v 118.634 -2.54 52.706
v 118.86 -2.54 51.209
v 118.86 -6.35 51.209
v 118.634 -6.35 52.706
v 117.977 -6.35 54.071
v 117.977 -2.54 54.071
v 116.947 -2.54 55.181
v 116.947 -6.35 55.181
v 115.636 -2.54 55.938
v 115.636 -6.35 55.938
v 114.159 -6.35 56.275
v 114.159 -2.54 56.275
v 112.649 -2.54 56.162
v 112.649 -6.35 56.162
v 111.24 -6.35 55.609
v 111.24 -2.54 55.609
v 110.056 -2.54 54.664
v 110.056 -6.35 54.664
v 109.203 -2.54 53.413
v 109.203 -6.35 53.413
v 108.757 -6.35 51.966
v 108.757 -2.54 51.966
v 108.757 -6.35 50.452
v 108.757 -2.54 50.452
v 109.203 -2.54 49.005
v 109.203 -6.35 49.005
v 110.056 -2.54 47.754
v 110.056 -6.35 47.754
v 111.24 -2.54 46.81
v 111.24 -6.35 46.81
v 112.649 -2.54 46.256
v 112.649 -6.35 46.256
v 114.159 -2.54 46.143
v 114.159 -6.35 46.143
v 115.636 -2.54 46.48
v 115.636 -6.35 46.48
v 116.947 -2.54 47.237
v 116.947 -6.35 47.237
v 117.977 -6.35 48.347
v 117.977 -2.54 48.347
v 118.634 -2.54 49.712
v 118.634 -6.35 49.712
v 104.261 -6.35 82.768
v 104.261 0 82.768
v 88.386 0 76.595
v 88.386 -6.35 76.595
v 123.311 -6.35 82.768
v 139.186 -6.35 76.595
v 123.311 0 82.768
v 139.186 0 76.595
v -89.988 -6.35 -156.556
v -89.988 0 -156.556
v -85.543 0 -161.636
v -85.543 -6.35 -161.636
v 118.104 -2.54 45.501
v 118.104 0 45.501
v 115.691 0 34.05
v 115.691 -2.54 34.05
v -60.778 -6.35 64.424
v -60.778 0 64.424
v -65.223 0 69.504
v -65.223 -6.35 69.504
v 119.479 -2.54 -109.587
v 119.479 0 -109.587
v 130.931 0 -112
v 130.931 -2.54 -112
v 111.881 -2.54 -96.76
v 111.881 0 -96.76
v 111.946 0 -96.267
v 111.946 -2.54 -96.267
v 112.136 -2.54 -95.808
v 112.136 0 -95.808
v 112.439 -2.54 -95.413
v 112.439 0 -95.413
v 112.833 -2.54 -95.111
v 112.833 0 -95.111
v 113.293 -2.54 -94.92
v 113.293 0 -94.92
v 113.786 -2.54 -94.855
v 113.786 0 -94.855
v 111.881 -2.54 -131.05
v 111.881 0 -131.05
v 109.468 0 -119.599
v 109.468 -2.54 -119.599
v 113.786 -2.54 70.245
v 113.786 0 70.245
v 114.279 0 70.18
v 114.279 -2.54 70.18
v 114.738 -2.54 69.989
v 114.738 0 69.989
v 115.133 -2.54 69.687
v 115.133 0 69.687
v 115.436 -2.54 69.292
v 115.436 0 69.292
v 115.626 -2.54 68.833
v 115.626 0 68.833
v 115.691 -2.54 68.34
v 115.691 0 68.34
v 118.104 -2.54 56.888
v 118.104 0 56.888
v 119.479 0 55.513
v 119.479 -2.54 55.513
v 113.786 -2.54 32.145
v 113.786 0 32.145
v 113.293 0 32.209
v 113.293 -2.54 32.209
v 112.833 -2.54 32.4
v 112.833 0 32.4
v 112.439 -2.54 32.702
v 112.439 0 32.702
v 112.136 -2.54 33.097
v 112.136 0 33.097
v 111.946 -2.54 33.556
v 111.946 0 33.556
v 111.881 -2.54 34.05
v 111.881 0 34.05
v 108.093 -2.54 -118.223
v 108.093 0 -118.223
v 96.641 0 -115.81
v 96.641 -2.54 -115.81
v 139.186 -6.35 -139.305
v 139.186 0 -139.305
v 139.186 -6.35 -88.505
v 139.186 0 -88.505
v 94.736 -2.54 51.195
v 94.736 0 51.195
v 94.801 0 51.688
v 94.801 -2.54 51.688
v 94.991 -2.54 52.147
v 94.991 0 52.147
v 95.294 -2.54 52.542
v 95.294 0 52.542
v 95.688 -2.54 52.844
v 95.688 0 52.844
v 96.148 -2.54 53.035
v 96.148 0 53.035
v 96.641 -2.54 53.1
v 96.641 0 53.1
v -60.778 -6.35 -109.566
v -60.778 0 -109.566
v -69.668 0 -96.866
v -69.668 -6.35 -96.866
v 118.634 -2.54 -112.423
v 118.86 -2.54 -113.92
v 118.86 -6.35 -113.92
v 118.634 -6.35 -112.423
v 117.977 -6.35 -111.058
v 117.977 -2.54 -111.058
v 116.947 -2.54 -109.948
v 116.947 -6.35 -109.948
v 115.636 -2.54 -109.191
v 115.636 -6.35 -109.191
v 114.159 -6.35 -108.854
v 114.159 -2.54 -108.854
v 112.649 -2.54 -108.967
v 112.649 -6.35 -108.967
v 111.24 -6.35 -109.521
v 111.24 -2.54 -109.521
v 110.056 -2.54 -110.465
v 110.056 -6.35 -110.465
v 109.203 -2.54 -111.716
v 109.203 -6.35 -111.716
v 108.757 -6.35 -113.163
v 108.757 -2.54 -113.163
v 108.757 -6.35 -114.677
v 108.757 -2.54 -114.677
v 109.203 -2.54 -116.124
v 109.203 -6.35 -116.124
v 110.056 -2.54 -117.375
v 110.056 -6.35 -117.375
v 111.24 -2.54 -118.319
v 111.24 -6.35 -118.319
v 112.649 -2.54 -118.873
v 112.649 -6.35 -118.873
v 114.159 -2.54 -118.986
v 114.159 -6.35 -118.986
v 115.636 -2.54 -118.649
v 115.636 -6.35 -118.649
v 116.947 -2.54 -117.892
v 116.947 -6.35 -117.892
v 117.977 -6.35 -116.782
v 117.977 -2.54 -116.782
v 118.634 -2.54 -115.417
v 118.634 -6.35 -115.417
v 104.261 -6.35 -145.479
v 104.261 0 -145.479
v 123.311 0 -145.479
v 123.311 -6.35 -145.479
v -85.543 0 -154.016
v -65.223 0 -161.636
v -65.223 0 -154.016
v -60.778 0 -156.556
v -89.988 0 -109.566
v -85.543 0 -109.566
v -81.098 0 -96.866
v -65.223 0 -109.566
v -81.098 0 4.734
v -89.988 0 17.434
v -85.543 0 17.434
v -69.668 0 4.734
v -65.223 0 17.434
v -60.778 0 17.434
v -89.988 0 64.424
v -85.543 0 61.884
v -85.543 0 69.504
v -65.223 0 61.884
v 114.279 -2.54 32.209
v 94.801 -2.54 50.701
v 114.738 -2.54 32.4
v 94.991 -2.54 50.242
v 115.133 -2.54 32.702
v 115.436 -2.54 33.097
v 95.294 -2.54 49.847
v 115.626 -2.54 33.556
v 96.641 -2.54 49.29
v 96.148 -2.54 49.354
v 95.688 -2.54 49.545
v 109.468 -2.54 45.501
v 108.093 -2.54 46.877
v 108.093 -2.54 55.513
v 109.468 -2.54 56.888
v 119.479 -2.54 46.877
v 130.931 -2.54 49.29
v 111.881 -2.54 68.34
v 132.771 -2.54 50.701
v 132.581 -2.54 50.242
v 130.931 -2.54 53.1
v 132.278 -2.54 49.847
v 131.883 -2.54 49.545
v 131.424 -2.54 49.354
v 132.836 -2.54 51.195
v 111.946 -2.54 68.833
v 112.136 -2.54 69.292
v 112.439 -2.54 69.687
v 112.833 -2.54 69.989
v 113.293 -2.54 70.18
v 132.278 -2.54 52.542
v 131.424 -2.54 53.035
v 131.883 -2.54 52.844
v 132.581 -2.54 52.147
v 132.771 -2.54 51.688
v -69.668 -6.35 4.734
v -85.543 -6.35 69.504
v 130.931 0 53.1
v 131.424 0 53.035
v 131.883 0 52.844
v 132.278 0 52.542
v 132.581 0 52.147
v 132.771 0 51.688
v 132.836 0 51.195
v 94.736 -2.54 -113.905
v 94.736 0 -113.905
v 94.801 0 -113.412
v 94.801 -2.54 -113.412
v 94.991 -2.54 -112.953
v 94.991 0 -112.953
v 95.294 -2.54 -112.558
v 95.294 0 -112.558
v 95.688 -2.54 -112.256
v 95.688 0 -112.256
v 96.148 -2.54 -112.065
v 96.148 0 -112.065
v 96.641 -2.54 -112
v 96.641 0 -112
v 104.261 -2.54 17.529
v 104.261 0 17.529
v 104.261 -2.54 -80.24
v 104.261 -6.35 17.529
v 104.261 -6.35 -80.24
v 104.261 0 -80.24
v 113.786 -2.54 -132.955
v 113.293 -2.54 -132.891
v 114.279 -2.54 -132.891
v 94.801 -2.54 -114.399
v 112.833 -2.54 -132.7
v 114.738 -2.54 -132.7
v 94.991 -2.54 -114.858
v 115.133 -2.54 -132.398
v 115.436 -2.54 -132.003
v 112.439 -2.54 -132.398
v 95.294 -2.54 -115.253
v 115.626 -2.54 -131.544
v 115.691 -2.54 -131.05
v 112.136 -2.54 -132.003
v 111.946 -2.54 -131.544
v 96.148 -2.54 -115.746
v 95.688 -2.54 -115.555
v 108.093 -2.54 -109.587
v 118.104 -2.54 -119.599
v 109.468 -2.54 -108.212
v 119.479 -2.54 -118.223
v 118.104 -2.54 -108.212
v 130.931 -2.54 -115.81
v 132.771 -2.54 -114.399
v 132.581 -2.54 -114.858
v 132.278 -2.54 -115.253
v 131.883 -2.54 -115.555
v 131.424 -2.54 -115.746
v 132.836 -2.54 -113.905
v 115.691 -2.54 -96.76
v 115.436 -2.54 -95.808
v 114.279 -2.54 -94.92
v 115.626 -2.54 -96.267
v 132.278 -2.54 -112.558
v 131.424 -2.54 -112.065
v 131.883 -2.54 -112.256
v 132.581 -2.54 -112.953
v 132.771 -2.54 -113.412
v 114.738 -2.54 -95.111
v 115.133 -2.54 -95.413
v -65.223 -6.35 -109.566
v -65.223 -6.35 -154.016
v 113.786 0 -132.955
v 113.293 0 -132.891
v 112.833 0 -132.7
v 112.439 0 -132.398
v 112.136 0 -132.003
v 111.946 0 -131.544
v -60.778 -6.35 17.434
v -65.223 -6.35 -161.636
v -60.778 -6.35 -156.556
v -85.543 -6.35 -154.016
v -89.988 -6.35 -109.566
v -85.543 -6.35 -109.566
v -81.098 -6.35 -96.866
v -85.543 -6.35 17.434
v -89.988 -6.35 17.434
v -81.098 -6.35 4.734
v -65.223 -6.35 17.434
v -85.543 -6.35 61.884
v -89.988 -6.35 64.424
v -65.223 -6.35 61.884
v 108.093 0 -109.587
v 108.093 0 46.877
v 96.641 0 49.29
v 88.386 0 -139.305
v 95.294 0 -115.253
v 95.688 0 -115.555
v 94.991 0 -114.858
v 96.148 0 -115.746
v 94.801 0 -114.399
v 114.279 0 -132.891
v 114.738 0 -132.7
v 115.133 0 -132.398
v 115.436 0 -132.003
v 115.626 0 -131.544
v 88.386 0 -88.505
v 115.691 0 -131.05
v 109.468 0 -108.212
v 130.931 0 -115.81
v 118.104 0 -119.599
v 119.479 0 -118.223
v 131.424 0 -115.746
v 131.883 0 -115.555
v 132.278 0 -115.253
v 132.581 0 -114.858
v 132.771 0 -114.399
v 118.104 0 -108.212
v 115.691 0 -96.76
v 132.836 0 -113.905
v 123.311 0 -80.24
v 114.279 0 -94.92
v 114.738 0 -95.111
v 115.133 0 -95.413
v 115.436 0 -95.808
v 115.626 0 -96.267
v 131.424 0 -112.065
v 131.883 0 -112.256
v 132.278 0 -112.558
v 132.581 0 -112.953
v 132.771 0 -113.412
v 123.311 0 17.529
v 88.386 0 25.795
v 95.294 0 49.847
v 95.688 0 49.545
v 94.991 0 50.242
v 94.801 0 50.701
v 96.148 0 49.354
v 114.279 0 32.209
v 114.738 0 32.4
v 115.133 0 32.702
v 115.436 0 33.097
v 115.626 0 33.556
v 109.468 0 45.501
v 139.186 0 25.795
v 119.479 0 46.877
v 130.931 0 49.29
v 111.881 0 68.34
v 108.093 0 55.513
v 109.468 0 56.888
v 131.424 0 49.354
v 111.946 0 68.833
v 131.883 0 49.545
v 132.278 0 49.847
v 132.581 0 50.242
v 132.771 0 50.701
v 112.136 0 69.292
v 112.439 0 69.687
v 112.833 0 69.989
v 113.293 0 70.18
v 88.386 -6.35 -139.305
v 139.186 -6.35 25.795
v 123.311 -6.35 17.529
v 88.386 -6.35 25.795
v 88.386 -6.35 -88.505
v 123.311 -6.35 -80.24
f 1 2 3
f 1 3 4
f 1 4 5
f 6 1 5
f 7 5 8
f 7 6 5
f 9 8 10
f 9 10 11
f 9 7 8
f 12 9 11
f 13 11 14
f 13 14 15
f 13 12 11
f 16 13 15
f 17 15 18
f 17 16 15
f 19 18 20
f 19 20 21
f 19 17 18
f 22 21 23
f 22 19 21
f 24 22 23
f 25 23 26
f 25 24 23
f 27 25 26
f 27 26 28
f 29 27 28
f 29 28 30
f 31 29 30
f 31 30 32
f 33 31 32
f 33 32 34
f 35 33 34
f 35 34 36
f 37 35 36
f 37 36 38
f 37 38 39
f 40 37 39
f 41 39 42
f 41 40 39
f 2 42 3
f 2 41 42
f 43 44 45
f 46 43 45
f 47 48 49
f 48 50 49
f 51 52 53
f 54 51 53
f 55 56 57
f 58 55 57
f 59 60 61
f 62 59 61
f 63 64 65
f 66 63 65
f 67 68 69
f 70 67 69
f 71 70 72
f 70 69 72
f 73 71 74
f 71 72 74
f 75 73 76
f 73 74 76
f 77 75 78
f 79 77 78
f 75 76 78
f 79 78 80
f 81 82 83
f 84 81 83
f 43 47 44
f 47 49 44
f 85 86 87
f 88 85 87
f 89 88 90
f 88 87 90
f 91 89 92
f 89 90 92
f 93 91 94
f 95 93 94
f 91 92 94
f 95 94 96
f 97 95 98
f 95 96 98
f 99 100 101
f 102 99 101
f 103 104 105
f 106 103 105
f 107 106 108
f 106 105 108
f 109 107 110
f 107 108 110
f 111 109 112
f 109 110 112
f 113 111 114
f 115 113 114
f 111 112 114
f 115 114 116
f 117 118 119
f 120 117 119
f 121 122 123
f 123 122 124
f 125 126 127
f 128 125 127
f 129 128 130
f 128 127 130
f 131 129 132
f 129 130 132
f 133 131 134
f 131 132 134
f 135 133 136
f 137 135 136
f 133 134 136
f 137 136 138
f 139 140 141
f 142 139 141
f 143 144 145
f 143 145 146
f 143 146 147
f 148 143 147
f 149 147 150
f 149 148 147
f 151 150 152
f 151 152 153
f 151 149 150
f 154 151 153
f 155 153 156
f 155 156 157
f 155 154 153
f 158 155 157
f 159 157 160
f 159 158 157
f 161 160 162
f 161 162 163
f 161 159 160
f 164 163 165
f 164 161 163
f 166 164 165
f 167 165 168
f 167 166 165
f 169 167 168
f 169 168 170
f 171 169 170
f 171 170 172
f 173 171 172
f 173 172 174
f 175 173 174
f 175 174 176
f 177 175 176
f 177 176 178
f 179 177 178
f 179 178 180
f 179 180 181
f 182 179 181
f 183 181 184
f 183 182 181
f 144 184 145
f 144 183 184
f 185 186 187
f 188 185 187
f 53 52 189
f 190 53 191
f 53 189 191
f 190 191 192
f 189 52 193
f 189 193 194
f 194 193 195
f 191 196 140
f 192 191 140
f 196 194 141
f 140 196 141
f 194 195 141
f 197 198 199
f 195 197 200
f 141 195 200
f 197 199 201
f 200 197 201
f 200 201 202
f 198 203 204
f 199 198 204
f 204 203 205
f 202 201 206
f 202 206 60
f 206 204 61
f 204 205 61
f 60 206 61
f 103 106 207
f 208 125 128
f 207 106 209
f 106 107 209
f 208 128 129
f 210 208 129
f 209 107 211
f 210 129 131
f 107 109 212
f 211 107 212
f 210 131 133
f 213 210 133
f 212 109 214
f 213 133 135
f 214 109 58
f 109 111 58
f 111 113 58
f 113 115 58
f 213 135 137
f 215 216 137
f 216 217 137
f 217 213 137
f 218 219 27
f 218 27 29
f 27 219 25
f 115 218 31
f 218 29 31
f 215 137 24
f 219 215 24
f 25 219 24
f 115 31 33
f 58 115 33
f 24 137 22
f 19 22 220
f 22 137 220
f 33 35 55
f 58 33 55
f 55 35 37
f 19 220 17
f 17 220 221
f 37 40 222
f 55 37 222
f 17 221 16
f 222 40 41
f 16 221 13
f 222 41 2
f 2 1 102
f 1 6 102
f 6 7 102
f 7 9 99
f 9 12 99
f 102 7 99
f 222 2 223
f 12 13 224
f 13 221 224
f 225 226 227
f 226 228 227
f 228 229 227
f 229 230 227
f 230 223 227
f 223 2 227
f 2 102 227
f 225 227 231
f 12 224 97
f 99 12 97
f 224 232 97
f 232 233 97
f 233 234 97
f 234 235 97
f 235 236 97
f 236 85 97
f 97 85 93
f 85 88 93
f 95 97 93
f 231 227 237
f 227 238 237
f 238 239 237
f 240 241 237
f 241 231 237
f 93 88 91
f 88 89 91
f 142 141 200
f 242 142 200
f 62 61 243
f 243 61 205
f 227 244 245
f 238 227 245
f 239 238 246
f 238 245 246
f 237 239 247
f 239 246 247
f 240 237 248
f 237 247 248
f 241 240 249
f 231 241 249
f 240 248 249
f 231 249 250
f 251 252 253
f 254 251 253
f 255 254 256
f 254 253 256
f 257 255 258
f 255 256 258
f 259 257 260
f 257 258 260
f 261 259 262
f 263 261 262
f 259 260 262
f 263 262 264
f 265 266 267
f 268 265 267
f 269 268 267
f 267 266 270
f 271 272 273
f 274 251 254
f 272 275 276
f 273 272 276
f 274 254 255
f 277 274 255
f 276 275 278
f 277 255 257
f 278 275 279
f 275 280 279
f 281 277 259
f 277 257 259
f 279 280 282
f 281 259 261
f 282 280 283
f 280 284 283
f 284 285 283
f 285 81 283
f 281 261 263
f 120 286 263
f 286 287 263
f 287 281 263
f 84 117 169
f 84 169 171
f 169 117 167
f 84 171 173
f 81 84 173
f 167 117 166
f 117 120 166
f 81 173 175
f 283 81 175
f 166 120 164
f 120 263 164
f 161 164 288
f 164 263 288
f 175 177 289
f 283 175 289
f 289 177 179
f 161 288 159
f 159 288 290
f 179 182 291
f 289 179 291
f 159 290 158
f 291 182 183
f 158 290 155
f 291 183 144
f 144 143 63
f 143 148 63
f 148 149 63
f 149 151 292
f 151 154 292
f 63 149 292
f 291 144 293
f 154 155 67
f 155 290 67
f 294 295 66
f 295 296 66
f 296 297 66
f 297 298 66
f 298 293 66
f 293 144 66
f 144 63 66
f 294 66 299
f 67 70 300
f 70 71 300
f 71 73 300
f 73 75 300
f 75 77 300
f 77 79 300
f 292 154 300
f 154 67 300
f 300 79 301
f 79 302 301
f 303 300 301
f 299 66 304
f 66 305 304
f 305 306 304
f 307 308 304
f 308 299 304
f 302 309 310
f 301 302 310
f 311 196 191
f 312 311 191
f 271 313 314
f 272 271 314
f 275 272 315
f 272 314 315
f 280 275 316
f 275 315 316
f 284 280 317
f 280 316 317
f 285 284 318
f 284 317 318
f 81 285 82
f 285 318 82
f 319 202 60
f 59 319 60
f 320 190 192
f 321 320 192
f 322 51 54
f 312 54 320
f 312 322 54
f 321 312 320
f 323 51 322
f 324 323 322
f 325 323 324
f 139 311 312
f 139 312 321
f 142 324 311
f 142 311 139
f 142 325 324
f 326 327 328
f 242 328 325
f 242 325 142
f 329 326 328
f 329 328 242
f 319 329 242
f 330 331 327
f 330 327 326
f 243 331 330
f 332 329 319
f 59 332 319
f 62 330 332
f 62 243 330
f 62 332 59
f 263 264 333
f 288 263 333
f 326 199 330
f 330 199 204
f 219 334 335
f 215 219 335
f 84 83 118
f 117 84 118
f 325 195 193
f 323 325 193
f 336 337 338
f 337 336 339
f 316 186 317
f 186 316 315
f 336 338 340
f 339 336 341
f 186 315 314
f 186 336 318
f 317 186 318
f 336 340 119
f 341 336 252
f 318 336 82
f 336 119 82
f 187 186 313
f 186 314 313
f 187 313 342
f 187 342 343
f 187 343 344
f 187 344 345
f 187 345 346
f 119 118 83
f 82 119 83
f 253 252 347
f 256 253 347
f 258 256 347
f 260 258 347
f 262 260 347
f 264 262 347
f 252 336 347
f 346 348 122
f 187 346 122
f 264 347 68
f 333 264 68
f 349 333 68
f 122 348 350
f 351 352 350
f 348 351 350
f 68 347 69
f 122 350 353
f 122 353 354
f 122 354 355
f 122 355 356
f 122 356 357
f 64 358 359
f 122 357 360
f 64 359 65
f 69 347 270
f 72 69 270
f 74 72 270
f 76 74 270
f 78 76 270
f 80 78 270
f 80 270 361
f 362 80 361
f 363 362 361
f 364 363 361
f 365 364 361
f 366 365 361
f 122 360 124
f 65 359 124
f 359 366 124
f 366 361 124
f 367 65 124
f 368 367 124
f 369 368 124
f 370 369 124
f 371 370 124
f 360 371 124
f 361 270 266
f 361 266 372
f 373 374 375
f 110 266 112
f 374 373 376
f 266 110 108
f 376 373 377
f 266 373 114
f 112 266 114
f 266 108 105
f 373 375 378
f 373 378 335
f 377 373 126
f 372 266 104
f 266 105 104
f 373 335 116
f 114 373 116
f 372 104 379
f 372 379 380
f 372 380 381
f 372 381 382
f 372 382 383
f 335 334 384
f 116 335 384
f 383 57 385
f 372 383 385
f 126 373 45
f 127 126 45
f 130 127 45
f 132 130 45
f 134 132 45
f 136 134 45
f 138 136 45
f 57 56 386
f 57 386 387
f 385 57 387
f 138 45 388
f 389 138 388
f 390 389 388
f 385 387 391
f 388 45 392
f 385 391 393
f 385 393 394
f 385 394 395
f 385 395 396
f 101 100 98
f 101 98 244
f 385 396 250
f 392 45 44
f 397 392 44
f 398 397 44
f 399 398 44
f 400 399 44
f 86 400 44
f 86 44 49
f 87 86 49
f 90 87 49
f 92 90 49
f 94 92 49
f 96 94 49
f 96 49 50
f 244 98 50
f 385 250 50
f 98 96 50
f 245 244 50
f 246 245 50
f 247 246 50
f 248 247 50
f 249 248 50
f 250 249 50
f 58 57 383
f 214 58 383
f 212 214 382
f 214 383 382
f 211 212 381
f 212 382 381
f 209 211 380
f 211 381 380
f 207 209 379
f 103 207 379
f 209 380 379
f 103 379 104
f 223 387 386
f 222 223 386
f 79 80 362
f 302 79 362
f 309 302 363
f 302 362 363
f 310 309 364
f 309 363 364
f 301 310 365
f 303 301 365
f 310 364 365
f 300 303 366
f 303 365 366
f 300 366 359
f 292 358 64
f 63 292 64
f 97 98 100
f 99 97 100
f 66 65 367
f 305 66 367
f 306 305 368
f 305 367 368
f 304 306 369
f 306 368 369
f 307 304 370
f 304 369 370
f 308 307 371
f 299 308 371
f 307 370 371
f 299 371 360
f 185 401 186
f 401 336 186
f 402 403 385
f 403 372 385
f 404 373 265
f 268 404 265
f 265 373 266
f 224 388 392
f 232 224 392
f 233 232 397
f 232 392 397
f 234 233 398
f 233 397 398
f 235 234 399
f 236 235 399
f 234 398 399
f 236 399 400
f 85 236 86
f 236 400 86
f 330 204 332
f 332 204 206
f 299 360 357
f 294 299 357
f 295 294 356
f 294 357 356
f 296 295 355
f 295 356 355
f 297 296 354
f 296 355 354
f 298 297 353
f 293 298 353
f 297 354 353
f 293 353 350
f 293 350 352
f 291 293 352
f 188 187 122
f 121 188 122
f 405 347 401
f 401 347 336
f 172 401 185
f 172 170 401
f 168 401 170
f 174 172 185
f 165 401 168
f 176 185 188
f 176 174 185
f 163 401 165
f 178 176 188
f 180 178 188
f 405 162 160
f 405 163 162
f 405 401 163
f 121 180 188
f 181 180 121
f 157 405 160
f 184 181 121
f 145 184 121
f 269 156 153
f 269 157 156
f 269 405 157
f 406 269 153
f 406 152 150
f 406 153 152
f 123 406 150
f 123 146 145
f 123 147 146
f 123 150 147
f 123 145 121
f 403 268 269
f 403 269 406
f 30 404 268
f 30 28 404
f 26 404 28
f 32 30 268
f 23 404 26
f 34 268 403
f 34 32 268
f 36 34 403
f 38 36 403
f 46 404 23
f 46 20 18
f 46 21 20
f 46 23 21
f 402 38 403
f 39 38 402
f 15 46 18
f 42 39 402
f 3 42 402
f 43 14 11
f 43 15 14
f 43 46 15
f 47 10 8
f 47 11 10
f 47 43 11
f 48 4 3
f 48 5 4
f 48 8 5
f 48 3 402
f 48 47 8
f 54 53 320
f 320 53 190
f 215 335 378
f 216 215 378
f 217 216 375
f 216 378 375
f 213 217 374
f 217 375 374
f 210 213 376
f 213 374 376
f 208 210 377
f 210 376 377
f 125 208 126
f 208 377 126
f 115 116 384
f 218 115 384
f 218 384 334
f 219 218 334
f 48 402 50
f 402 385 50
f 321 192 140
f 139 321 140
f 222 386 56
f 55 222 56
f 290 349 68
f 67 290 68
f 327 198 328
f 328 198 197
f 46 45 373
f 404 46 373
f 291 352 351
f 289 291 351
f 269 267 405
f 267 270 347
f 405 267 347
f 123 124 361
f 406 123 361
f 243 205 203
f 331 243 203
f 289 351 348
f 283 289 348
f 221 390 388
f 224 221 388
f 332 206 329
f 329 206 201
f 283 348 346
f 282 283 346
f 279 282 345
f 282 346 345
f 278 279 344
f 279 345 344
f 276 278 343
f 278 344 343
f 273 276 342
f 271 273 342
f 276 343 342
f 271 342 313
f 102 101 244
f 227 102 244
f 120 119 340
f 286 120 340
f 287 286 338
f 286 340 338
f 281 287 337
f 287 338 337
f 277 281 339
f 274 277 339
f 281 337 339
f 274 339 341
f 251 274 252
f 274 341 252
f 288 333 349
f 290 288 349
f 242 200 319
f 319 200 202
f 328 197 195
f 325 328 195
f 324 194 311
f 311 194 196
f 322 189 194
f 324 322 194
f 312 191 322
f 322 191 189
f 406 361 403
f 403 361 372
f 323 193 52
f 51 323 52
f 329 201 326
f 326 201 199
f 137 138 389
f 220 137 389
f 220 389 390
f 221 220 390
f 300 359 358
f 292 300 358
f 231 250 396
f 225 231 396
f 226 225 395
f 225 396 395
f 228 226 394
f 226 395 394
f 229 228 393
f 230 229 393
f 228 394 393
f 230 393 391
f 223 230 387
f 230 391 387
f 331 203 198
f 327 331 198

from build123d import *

# Parameters (mm, degrees)
F1_DEPTH = 6.35
F2_W     = 19.05
F2_H     = 8.2657442963
F2_H_2   = 48.8842557037
F3_DEPTH = 2.54
F4_R     = 5.08
F5_DEPTH = 3.81
F8_DEPTH = 3.81


# Not quite as in the source:
# - a feature names something its author has since deleted; it is built from what else it names


with BuildPart() as f1:
    # F0 (on Front) → F1 (new body)
    with BuildSketch(Plane.XZ):
        Polygon((-89.9882571208, 17.4341889973), (-85.5432571208, 17.4341889973), (-85.5432571208, 61.8841889973), (-65.2232571208, 61.8841889973), (-65.2232571208, 17.4341889973), (-60.7782571208, 17.4341889973), (-60.7782571208, 64.4241889973), (-89.9882571208, 64.4241889973), align=None)
        Polygon((-81.0982571208, 4.7341889973), (-81.0982571208, 17.4341889973), (-85.5432571208, 17.4341889973), (-89.9882571208, 17.4341889973), align=None)
        Polygon((-69.6682571208, 17.4341889973), (-81.0982571208, 17.4341889973), (-81.0982571208, 4.7341889973), (-81.0982571208, -46.0658110027), (-69.6682571208, -46.0658110027), (-69.6682571208, 4.7341889973), align=None)
        Polygon((-65.2232571208, 17.4341889973), (-69.6682571208, 17.4341889973), (-69.6682571208, 4.7341889973), (-60.7782571208, 17.4341889973), align=None)
        Polygon((-69.6682571208, -46.0658110027), (-81.0982571208, -46.0658110027), (-81.0982571208, -96.8658110027), (-81.0982571208, -109.5658110027), (-69.6682571208, -109.5658110027), (-69.6682571208, -96.8658110027), align=None)
        Polygon((-81.0982571208, -109.5658110027), (-81.0982571208, -96.8658110027), (-89.9882571208, -109.5658110027), (-85.5432571208, -109.5658110027), align=None)
        Polygon((-60.7782571208, -109.5658110027), (-69.6682571208, -96.8658110027), (-69.6682571208, -109.5658110027), (-65.2232571208, -109.5658110027), align=None)
        Polygon((-85.5432571208, -109.5658110027), (-89.9882571208, -109.5658110027), (-89.9882571208, -156.5558110027), (-60.7782571208, -156.5558110027), (-60.7782571208, -109.5658110027), (-65.2232571208, -109.5658110027), (-65.2232571208, -154.0158110027), (-85.5432571208, -154.0158110027), align=None)
        Polygon((-85.5432571208, 69.5041889973), (-89.9882571208, 64.4241889973), (-60.7782571208, 64.4241889973), (-65.2232571208, 69.5041889973), align=None)
        Polygon((-60.7782571208, -156.5558110027), (-89.9882571208, -156.5558110027), (-85.5432571208, -161.6358110027), (-65.2232571208, -161.6358110027), align=None)
    extrude(amount=F1_DEPTH)


with BuildPart() as f3:
    # F2 (on Front) → F3 (new body)
    with BuildSketch(Plane.XZ):
        Polygon((104.2609019141, -88.5054777617), (88.3859019141, -88.5054777617), (88.3859019141, -139.3054777617), (139.1859019141, -139.3054777617), (139.1859019141, -88.5054777617), (123.3109019141, -88.5054777617), align=None)
        with BuildLine():
            ThreePointArc((113.7859019141, -132.9554777617), (112.438863496, -132.3975161798), (111.8809019141, -131.0504777617))
            Line((111.8809019141, -131.0504777617), (109.4679019141, -119.5985076655))
            Line((109.4679019141, -119.5985076655), (108.0928720103, -118.2234777617))
            Line((108.0928720103, -118.2234777617), (96.6409019141, -115.8104777617))
            ThreePointArc((96.6409019141, -115.8104777617), (95.293863496, -115.2525161798), (94.7359019141, -113.9054777617))
            ThreePointArc((94.7359019141, -113.9054777617), (95.293863496, -112.5584393435), (96.6409019141, -112.0004777617))
            Line((96.6409019141, -112.0004777617), (108.0928720103, -109.5874777617))
            Line((108.0928720103, -109.5874777617), (109.4679019141, -108.2124478579))
            Line((109.4679019141, -108.2124478579), (111.8809019141, -96.7604777617))
            ThreePointArc((111.8809019141, -96.7604777617), (112.438863496, -95.4134393435), (113.7859019141, -94.8554777617))
            ThreePointArc((113.7859019141, -94.8554777617), (115.1329403323, -95.4134393435), (115.6909019141, -96.7604777617))
            Line((115.6909019141, -96.7604777617), (118.1039019141, -108.2124478579))
            Line((118.1039019141, -108.2124478579), (119.4789318179, -109.5874777617))
            Line((119.4789318179, -109.5874777617), (130.9309019141, -112.0004777617))
            ThreePointArc((130.9309019141, -112.0004777617), (132.2779403323, -112.5584393435), (132.8359019141, -113.9054777617))
            ThreePointArc((132.8359019141, -113.9054777617), (132.2779403323, -115.2525161798), (130.9309019141, -115.8104777617))
            Line((130.9309019141, -115.8104777617), (119.4789318179, -118.2234777617))
            Line((119.4789318179, -118.2234777617), (118.1039019141, -119.5985076655))
            Line((118.1039019141, -119.5985076655), (115.6909019141, -131.0504777617))
            ThreePointArc((115.6909019141, -131.0504777617), (115.1329403323, -132.3975161798), (113.7859019141, -132.9554777617))
        make_face(mode=Mode.SUBTRACT)
        Polygon((139.1859019141, -139.3054777617), (88.3859019141, -139.3054777617), (104.2609019141, -145.4785017002), (123.3109019141, -145.4785017002), align=None)
        Polygon((104.2609019141, -88.5054777617), (104.2609019141, -80.2397334654), (88.3859019141, -88.5054777617), align=None)
        with Locations((113.7859019141, -84.3726056135)):
            Rectangle(F2_W, F2_H)
        Polygon((139.1859019141, -88.5054777617), (123.3109019141, -80.2397334654), (123.3109019141, -88.5054777617), align=None)
        with Locations((113.7859019141, -55.7976056135)):
            Rectangle(F2_W, F2_H_2)
        with Locations((113.7859019141, -6.9133499098)):
            Rectangle(F2_W, F2_H_2)
        Polygon((139.1859019141, 76.5945222383), (88.3859019141, 76.5945222383), (88.3859019141, 25.7945222383), (104.2609019141, 25.7945222383), (123.3109019141, 25.7945222383), (139.1859019141, 25.7945222383), align=None)
        with BuildLine():
            Line((109.4679019141, 56.8875521421), (111.8809019141, 68.3395222383))
            ThreePointArc((111.8809019141, 68.3395222383), (112.438863496, 69.6865606565), (113.7859019141, 70.2445222383))
            ThreePointArc((113.7859019141, 70.2445222383), (115.1329403323, 69.6865606565), (115.6909019141, 68.3395222383))
            Line((115.6909019141, 68.3395222383), (118.1039019141, 56.8875521421))
            Line((118.1039019141, 56.8875521421), (119.4789318179, 55.5125222383))
            Line((119.4789318179, 55.5125222383), (130.9309019141, 53.0995222383))
            ThreePointArc((130.9309019141, 53.0995222383), (132.2779403323, 52.5415606565), (132.8359019141, 51.1945222383))
            ThreePointArc((132.8359019141, 51.1945222383), (132.2779403323, 49.8474838202), (130.9309019141, 49.2895222383))
            Line((130.9309019141, 49.2895222383), (119.4789318179, 46.8765222383))
            Line((119.4789318179, 46.8765222383), (118.1039019141, 45.5014923345))
            Line((118.1039019141, 45.5014923345), (115.6909019141, 34.0495222383))
            ThreePointArc((115.6909019141, 34.0495222383), (115.1329403323, 32.7024838202), (113.7859019141, 32.1445222383))
            ThreePointArc((113.7859019141, 32.1445222383), (112.438863496, 32.7024838202), (111.8809019141, 34.0495222383))
            Line((111.8809019141, 34.0495222383), (109.4679019141, 45.5014923345))
            Line((109.4679019141, 45.5014923345), (108.0928720103, 46.8765222383))
            Line((108.0928720103, 46.8765222383), (96.6409019141, 49.2895222383))
            ThreePointArc((96.6409019141, 49.2895222383), (95.293863496, 49.8474838202), (94.7359019141, 51.1945222383))
            ThreePointArc((94.7359019141, 51.1945222383), (95.293863496, 52.5415606565), (96.6409019141, 53.0995222383))
            Line((96.6409019141, 53.0995222383), (108.0928720103, 55.5125222383))
            Line((108.0928720103, 55.5125222383), (109.4679019141, 56.8875521421))
        make_face(mode=Mode.SUBTRACT)
        Polygon((104.2609019141, 25.7945222383), (88.3859019141, 25.7945222383), (104.2609019141, 17.5287779421), align=None)
        with Locations((113.7859019141, 21.6616500902)):
            Rectangle(F2_W, F2_H)
        Polygon((123.3109019141, 17.5287779421), (139.1859019141, 25.7945222383), (123.3109019141, 25.7945222383), align=None)
        Polygon((104.2609019141, 82.7675461769), (88.3859019141, 76.5945222383), (139.1859019141, 76.5945222383), (123.3109019141, 82.7675461769), align=None)
    extrude(amount=F3_DEPTH)

    # F4 (on face) → F5 (join)
    with BuildSketch(Plane.XZ.offset(2.54)):
        Polygon((104.2609019141, -31.3554777617), (123.3109019141, -31.3554777617), (123.3109019141, 17.5287779421), (139.1859019141, 25.7945222383), (139.1859019141, 76.5945222383), (123.3109019141, 82.7675461769), (104.2609019141, 82.7675461769), (88.3859019141, 76.5945222383), (88.3859019141, 25.7945222383), (104.2609019141, 17.5287779421), align=None)
        with BuildLine():
            Line((108.0928720103, 55.5125222383), (109.4679019141, 56.8875521421))
            Line((109.4679019141, 56.8875521421), (111.8809019141, 68.3395222383))
            ThreePointArc((111.8809019141, 68.3395222383), (113.7859019141, 70.2445222383), (115.6909019141, 68.3395222383))
            Line((115.6909019141, 68.3395222383), (118.1039019141, 56.8875521421))
            Line((118.1039019141, 56.8875521421), (119.4789318179, 55.5125222383))
            Line((119.4789318179, 55.5125222383), (130.9309019141, 53.0995222383))
            ThreePointArc((130.9309019141, 53.0995222383), (132.8359019141, 51.1945222383), (130.9309019141, 49.2895222383))
            Line((130.9309019141, 49.2895222383), (119.4789318179, 46.8765222383))
            Line((119.4789318179, 46.8765222383), (118.1039019141, 45.5014923345))
            Line((118.1039019141, 45.5014923345), (115.6909019141, 34.0495222383))
            ThreePointArc((115.6909019141, 34.0495222383), (113.7859019141, 32.1445222383), (111.8809019141, 34.0495222383))
            Line((111.8809019141, 34.0495222383), (109.4679019141, 45.5014923345))
            Line((109.4679019141, 45.5014923345), (108.0928720103, 46.8765222383))
            Line((108.0928720103, 46.8765222383), (96.6409019141, 49.2895222383))
            ThreePointArc((96.6409019141, 49.2895222383), (94.7359019141, 51.1945222383), (96.6409019141, 53.0995222383))
            Line((96.6409019141, 53.0995222383), (108.0928720103, 55.5125222383))
        make_face(mode=Mode.SUBTRACT)
        with BuildLine():
            Line((111.8809019141, 68.3395222383), (109.4679019141, 56.8875521421))
            Line((109.4679019141, 56.8875521421), (108.0928720103, 55.5125222383))
            Line((108.0928720103, 55.5125222383), (96.6409019141, 53.0995222383))
            ThreePointArc((96.6409019141, 53.0995222383), (94.7359019141, 51.1945222383), (96.6409019141, 49.2895222383))
            Line((96.6409019141, 49.2895222383), (108.0928720103, 46.8765222383))
            Line((108.0928720103, 46.8765222383), (109.4679019141, 45.5014923345))
            Line((109.4679019141, 45.5014923345), (111.8809019141, 34.0495222383))
            ThreePointArc((111.8809019141, 34.0495222383), (113.7859019141, 32.1445222383), (115.6909019141, 34.0495222383))
            Line((115.6909019141, 34.0495222383), (118.1039019141, 45.5014923345))
            Line((118.1039019141, 45.5014923345), (119.4789318179, 46.8765222383))
            Line((119.4789318179, 46.8765222383), (130.9309019141, 49.2895222383))
            ThreePointArc((130.9309019141, 49.2895222383), (132.8359019141, 51.1945222383), (130.9309019141, 53.0995222383))
            Line((130.9309019141, 53.0995222383), (119.4789318179, 55.5125222383))
            Line((119.4789318179, 55.5125222383), (118.1039019141, 56.8875521421))
            Line((118.1039019141, 56.8875521421), (115.6909019141, 68.3395222383))
            ThreePointArc((115.6909019141, 68.3395222383), (113.7859019141, 70.2445222383), (111.8809019141, 68.3395222383))
        make_face()
        with Locations((113.7798130512, 51.2091144919)):
            Circle(F4_R, mode=Mode.SUBTRACT)
    extrude(amount=F5_DEPTH)

    # F4 (on face) → F8 (join)
    with BuildSketch(Plane.XZ.offset(2.54)):
        Polygon((123.3109019141, -80.2397334654), (123.3109019141, -31.3554777617), (104.2609019141, -31.3554777617), (104.2609019141, -80.2397334654), (88.3859019141, -88.5054777617), (88.3859019141, -139.3054777617), (104.2609019141, -145.4785017002), (123.3109019141, -145.4785017002), (139.1859019141, -139.3054777617), (139.1859019141, -88.5054777617), align=None)
        with BuildLine():
            ThreePointArc((130.9309019141, -112.0004777617), (132.8359019141, -113.9054777617), (130.9309019141, -115.8104777617))
            Line((130.9309019141, -115.8104777617), (119.4789318179, -118.2234777617))
            Line((119.4789318179, -118.2234777617), (118.1039019141, -119.5985076655))
            Line((118.1039019141, -119.5985076655), (115.6909019141, -131.0504777617))
            ThreePointArc((115.6909019141, -131.0504777617), (113.7859019141, -132.9554777617), (111.8809019141, -131.0504777617))
            Line((111.8809019141, -131.0504777617), (109.4679019141, -119.5985076655))
            Line((109.4679019141, -119.5985076655), (108.0928720103, -118.2234777617))
            Line((108.0928720103, -118.2234777617), (96.6409019141, -115.8104777617))
            ThreePointArc((96.6409019141, -115.8104777617), (94.7359019141, -113.9054777617), (96.6409019141, -112.0004777617))
            Line((96.6409019141, -112.0004777617), (108.0928720103, -109.5874777617))
            Line((108.0928720103, -109.5874777617), (109.4679019141, -108.2124478579))
            Line((109.4679019141, -108.2124478579), (111.8809019141, -96.7604777617))
            ThreePointArc((111.8809019141, -96.7604777617), (113.7859019141, -94.8554777617), (115.6909019141, -96.7604777617))
            Line((115.6909019141, -96.7604777617), (118.1039019141, -108.2124478579))
            Line((118.1039019141, -108.2124478579), (119.4789318179, -109.5874777617))
            Line((119.4789318179, -109.5874777617), (130.9309019141, -112.0004777617))
        make_face(mode=Mode.SUBTRACT)
        with BuildLine():
            Line((119.4789318179, -118.2234777617), (130.9309019141, -115.8104777617))
            ThreePointArc((130.9309019141, -115.8104777617), (132.8359019141, -113.9054777617), (130.9309019141, -112.0004777617))
            Line((130.9309019141, -112.0004777617), (119.4789318179, -109.5874777617))
            Line((119.4789318179, -109.5874777617), (118.1039019141, -108.2124478579))
            Line((118.1039019141, -108.2124478579), (115.6909019141, -96.7604777617))
            ThreePointArc((115.6909019141, -96.7604777617), (113.7859019141, -94.8554777617), (111.8809019141, -96.7604777617))
            Line((111.8809019141, -96.7604777617), (109.4679019141, -108.2124478579))
            Line((109.4679019141, -108.2124478579), (108.0928720103, -109.5874777617))
            Line((108.0928720103, -109.5874777617), (96.6409019141, -112.0004777617))
            ThreePointArc((96.6409019141, -112.0004777617), (94.7359019141, -113.9054777617), (96.6409019141, -115.8104777617))
            Line((96.6409019141, -115.8104777617), (108.0928720103, -118.2234777617))
            Line((108.0928720103, -118.2234777617), (109.4679019141, -119.5985076655))
            Line((109.4679019141, -119.5985076655), (111.8809019141, -131.0504777617))
            ThreePointArc((111.8809019141, -131.0504777617), (113.7859019141, -132.9554777617), (115.6909019141, -131.0504777617))
            Line((115.6909019141, -131.0504777617), (118.1039019141, -119.5985076655))
            Line((118.1039019141, -119.5985076655), (119.4789318179, -118.2234777617))
        make_face()
        with Locations((113.7798130512, -113.9200700153)):
            Circle(F4_R, mode=Mode.SUBTRACT)
    extrude(amount=F8_DEPTH)


solid = Compound([f1.part, f3.part])
